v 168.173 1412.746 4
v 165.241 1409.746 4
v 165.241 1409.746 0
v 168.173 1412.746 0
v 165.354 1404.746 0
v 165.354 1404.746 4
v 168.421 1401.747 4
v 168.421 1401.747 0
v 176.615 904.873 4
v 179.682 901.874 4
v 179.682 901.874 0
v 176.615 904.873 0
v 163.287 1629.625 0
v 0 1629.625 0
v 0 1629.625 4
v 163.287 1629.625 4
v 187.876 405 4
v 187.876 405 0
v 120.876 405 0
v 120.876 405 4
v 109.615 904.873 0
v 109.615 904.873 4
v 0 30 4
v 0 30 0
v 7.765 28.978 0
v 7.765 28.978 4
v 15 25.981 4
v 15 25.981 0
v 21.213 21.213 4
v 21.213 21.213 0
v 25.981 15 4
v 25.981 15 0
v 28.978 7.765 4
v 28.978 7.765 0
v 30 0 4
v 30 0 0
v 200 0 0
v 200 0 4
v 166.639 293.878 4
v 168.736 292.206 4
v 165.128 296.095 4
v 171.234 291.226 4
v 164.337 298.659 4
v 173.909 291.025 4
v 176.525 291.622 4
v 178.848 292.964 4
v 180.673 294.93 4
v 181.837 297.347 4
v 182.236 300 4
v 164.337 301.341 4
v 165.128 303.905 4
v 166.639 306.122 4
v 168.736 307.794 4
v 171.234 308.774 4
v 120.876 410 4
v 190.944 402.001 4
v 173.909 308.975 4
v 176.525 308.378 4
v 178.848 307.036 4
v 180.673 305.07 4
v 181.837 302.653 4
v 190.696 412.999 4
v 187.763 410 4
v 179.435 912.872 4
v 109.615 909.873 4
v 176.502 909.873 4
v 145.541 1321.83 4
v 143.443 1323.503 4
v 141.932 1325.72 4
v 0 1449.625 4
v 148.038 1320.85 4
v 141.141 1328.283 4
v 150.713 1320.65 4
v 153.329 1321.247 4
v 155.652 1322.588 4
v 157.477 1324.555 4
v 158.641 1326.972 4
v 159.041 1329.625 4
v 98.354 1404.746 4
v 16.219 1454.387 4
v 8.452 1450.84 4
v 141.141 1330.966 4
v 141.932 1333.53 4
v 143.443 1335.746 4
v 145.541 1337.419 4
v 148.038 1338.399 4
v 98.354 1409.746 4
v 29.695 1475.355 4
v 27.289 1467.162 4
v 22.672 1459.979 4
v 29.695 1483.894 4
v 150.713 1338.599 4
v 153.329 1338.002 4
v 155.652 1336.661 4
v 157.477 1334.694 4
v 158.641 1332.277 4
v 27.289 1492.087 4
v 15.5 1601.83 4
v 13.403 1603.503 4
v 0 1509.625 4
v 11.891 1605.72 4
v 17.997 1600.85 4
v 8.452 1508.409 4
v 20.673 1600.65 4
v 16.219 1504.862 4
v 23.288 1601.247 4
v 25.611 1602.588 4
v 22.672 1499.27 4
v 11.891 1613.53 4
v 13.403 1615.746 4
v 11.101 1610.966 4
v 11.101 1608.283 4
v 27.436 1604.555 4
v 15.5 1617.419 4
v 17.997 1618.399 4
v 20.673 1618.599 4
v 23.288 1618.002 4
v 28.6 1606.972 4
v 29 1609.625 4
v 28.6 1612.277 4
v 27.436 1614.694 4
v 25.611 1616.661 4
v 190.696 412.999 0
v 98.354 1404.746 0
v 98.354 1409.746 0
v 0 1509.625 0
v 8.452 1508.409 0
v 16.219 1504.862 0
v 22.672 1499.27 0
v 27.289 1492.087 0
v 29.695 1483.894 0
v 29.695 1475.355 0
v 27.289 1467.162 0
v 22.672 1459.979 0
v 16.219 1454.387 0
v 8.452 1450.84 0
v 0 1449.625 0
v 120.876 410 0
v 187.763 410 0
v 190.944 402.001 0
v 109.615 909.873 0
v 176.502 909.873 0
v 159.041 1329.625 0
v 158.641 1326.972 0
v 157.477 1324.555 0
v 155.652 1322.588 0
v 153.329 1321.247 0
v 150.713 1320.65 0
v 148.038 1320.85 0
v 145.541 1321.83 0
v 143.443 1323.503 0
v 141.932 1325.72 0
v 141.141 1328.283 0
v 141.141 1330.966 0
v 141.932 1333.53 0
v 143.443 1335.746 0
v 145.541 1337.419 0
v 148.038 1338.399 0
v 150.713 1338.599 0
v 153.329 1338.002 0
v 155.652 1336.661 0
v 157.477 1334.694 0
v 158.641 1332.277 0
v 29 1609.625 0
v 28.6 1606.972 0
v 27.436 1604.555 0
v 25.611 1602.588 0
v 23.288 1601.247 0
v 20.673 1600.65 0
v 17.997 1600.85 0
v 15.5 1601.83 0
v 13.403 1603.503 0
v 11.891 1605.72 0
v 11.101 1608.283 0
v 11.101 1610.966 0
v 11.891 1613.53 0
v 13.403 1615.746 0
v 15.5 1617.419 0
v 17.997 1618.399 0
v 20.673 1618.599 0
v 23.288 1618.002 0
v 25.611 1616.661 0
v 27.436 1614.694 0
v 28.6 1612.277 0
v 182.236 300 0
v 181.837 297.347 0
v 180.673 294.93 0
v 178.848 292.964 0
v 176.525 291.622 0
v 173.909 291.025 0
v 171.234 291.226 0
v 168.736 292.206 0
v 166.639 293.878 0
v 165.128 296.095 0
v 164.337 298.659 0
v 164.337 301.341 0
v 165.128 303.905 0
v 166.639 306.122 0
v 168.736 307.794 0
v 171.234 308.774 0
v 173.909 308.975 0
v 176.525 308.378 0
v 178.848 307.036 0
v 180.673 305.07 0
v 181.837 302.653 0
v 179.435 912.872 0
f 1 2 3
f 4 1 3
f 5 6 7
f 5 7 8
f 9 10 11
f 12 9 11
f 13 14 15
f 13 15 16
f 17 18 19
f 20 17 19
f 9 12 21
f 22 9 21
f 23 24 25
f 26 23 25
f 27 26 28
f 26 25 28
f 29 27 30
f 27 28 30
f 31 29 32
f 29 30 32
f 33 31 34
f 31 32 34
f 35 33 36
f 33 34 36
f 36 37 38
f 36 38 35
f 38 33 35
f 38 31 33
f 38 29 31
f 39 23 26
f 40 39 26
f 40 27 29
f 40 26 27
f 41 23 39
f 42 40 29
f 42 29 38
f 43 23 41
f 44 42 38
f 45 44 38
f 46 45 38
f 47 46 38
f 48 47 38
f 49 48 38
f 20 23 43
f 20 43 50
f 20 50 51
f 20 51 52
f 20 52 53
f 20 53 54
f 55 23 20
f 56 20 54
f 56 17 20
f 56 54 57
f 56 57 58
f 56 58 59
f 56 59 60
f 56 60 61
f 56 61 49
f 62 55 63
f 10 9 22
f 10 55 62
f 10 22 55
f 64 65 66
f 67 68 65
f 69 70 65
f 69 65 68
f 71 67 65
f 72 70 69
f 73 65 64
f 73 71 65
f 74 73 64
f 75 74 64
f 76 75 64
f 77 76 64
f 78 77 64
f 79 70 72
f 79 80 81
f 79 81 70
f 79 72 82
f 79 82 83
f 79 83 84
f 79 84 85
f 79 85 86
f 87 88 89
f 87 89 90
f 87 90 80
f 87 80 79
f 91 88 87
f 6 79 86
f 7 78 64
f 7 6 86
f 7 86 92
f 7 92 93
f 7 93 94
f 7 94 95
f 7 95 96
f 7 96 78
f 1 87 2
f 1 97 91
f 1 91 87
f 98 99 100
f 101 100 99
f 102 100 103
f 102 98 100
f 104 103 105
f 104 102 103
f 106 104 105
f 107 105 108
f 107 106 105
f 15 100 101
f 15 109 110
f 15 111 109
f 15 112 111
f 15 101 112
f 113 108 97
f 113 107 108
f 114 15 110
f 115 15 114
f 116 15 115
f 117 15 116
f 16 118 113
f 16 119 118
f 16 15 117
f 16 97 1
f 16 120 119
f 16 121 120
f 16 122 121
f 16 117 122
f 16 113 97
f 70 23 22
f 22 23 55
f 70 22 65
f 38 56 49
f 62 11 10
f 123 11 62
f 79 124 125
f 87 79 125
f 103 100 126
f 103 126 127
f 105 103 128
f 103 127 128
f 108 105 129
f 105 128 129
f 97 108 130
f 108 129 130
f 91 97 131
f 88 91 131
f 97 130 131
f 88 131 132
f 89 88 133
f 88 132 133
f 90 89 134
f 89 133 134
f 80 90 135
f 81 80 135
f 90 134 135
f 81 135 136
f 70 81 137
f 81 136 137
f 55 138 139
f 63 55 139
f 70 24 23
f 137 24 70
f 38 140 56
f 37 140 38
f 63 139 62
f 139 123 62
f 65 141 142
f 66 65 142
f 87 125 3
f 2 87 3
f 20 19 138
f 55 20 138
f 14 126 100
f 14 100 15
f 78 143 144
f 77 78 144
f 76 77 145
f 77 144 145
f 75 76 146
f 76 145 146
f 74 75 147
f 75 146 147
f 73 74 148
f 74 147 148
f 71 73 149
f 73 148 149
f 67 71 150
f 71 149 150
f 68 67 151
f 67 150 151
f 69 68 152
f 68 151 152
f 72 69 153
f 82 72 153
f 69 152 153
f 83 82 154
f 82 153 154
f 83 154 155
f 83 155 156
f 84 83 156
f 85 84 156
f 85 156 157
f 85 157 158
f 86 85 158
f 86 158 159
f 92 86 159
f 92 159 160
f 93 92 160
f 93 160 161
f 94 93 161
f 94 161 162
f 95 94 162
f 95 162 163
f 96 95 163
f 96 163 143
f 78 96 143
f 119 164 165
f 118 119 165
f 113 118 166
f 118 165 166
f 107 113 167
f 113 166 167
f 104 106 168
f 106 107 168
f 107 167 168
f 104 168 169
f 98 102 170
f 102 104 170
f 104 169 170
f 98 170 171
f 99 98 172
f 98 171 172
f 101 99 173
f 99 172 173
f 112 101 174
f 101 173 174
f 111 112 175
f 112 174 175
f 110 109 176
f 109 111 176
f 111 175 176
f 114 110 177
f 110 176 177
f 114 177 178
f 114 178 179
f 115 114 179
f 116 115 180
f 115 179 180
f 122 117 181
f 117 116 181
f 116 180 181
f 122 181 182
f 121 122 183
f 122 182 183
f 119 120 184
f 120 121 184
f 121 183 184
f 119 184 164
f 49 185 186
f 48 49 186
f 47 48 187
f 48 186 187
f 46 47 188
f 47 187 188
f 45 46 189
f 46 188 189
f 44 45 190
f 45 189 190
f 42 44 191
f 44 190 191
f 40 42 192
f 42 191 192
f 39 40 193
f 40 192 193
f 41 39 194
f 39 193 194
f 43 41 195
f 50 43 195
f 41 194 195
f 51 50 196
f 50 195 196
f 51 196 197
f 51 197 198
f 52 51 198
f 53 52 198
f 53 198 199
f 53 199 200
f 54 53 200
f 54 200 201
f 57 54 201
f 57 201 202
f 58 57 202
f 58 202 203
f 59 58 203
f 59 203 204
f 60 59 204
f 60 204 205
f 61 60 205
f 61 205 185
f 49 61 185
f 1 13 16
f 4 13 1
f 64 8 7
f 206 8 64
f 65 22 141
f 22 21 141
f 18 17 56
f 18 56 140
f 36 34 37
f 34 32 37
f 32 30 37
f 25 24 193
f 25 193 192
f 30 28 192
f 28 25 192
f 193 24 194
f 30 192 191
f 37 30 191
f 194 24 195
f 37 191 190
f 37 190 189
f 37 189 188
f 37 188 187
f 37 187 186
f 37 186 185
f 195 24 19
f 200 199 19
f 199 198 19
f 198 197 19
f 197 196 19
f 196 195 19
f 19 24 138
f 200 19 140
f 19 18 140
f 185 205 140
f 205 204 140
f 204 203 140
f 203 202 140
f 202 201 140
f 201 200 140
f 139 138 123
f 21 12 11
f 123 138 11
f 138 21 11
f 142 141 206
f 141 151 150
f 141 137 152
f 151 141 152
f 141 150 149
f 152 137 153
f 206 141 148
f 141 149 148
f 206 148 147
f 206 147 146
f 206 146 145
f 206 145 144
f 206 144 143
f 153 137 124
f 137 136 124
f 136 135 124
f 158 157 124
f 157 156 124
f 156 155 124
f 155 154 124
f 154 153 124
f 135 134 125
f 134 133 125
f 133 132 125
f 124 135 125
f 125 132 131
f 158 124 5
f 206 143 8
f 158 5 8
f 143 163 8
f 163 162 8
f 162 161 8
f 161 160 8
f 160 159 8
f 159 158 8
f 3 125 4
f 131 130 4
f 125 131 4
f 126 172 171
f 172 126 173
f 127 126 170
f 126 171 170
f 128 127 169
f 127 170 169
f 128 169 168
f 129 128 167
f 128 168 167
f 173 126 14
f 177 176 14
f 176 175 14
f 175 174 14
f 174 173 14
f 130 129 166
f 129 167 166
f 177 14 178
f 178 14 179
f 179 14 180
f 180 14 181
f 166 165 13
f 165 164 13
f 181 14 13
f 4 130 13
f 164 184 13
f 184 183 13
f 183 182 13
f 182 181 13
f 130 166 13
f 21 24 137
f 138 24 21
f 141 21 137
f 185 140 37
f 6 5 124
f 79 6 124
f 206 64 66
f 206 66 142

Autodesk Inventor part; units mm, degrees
ref_plane "YZ Plane" through (0, 0, 0) normal (1, 0, 0) x (0, 1, 0)
ref_plane "XZ Plane" through (0, 0, 0) normal (0, 1, 0) x (-1, 0, 0)
ref_plane "XY Plane" through (0, 0, 0) normal (0, 0, 1) x (1, 0, 0)
sketch "Sketch1" plane through (0, 0, 0) normal (0, 0, 1) x (1, 0, 0)
  line L0 (0, 0) -> (0, 4438.8737)
  line L1 (0, 4438.8737) -> (100, 4438.8737)
  line L2 (100, 4438.8737) -> (200, 0)
  line L3 (200, 0) -> (0, 0)
  circle A0 centre (0, 0) radius 30
  line L4 (0, 1479.6246) -> (166.6667, 1479.6246)
  line L5 (0, 2959.2492) -> (133.3333, 2959.2492)
  circle A1 centre (0, 1479.6246) radius 30
  circle A2 centre (0, 2959.2492) radius 30
  line L6 (190.8761, 405) -> (120.8761, 405)
  line L7 (120.8761, 405) -> (120.8761, 410)
  line L8 (120.8761, 410) -> (190.8761, 410)
  line L9 (190.8761, 410) -> (190.8761, 405)
  line L10 (109.6148, 909.8732) -> (179.6148, 909.8732)
  line L11 (179.6148, 904.8732) -> (109.6148, 904.8732)
  line L12 (109.6148, 904.8732) -> (109.6148, 909.8732)
  line L13 (179.6148, 909.8732) -> (179.6148, 904.8732)
  line L14 (98.3535, 1409.7463) -> (168.3535, 1409.7463)
  line L15 (168.3535, 1404.7463) -> (98.3535, 1404.7463)
  line L16 (98.3535, 1404.7463) -> (98.3535, 1409.7463)
  line L17 (168.3535, 1409.7463) -> (168.3535, 1404.7463)
  line L18 (87.0923, 1909.6195) -> (157.0923, 1909.6195)
  line L19 (157.0923, 1904.6195) -> (87.0923, 1904.6195)
  line L20 (87.0923, 1904.6195) -> (87.0923, 1909.6195)
  line L21 (157.0923, 1909.6195) -> (157.0923, 1904.6195)
  line L22 (75.831, 2409.4927) -> (145.831, 2409.4927)
  line L23 (145.831, 2404.4927) -> (75.831, 2404.4927)
  line L24 (75.831, 2404.4927) -> (75.831, 2409.4927)
  line L25 (145.831, 2409.4927) -> (145.831, 2404.4927)
  line L26 (64.5698, 2909.3658) -> (134.5698, 2909.3658)
  line L27 (134.5698, 2904.3658) -> (64.5698, 2904.3658)
  line L28 (64.5698, 2904.3658) -> (64.5698, 2909.3658)
  line L29 (134.5698, 2909.3658) -> (134.5698, 2904.3658)
  line L30 (53.3085, 3409.239) -> (123.3085, 3409.239)
  line L31 (123.3085, 3404.239) -> (53.3085, 3404.239)
  line L32 (53.3085, 3404.239) -> (53.3085, 3409.239)
  line L33 (123.3085, 3409.239) -> (123.3085, 3404.239)
  line L34 (42.0472, 3909.1122) -> (112.0472, 3909.1122)
  line L35 (112.0472, 3904.1122) -> (42.0472, 3904.1122)
  line L36 (42.0472, 3904.1122) -> (42.0472, 3909.1122)
  line L37 (112.0472, 3909.1122) -> (112.0472, 3904.1122)
  line L38 (0, 1629.6246) -> (163.2874, 1629.6246)
  line L39 (0, 3079.2492) -> (130.6299, 3079.2492)
  circle A3 centre (20, 1609.6246) radius 9
  circle A4 centre (150.0408, 1329.6246) radius 9
  circle A5 centre (173.2365, 300) radius 9
  line L40 (173.2365, 300) -> (150.0408, 1329.6246)
  point P0 (30, 2959.2492)
  point P1 (0, 2929.2492)
  point P2 (0, 1509.6246)
  point P3 (0, 1449.6246)
  point P4 (0, 30)
  point P5 (30, 0)
  point P6 (190.7634, 410)
  point P7 (179.5022, 909.8732)
  point P8 (168.3535, 1404.7463)
  point P9 (168.2409, 1409.7463)
  point P10 (30, 1479.6246)
  dimension "d65" = 100
  dimension "d67" = 200
  dimension "d68" = 60
  dimension "d69" = 1480
  dimension "d70" = 1480
  dimension "d71" = 1480
  dimension "d72" = 5
  dimension "d73" = 70
  dimension "d74" = 410
  dimension "d77" = 500
  dimension "d82" = 120
  dimension "d83" = 150
  dimension "d88" = 20
  dimension "d89" = 20
  dimension "d90" = 18
  dimension "d91" = 20
  dimension "d92" = 300
  dimension "d93" = 300
extrude "Plate3" add sketch "Sketch1" along normal blind 4 contours L38 L2 L4 A1 L0 | L4 L2 L14 L16 L15 L10 L12 L11 L40 L8 L7 L6 L3 A0 L0 A1 | L2 L8 L40 L11
chamfer "Corner Chamfer2" distance 3 angle 45 6 edges at (190.7634, 410, 2) (190.8761, 405, 2) (179.6148, 904.8732, 2) (179.5022, 909.8732, 2) (168.3535, 1404.7463, 2) (168.2409, 1409.7463, 2)
equation "\"BendRadius\" = Thickness"
equation "\"BendReliefWidth\" = Thickness"
equation "\"BendReliefDepth\" = 0.5 * Thickness"
equation "\"CornerReliefSize\" = 4 * Thickness"
equation "\"MinimumRemnant\" = 2 * Thickness"
equation "\"TransitionRadius\" = BendRadius"
equation "\"JacobiRadiusSize\" = BendRadius"
equation "\"GapSize\" = Thickness"
equation "\"Thickness\" = 4"
properties part number "GBK 3112 central main rib" material "Steel"
